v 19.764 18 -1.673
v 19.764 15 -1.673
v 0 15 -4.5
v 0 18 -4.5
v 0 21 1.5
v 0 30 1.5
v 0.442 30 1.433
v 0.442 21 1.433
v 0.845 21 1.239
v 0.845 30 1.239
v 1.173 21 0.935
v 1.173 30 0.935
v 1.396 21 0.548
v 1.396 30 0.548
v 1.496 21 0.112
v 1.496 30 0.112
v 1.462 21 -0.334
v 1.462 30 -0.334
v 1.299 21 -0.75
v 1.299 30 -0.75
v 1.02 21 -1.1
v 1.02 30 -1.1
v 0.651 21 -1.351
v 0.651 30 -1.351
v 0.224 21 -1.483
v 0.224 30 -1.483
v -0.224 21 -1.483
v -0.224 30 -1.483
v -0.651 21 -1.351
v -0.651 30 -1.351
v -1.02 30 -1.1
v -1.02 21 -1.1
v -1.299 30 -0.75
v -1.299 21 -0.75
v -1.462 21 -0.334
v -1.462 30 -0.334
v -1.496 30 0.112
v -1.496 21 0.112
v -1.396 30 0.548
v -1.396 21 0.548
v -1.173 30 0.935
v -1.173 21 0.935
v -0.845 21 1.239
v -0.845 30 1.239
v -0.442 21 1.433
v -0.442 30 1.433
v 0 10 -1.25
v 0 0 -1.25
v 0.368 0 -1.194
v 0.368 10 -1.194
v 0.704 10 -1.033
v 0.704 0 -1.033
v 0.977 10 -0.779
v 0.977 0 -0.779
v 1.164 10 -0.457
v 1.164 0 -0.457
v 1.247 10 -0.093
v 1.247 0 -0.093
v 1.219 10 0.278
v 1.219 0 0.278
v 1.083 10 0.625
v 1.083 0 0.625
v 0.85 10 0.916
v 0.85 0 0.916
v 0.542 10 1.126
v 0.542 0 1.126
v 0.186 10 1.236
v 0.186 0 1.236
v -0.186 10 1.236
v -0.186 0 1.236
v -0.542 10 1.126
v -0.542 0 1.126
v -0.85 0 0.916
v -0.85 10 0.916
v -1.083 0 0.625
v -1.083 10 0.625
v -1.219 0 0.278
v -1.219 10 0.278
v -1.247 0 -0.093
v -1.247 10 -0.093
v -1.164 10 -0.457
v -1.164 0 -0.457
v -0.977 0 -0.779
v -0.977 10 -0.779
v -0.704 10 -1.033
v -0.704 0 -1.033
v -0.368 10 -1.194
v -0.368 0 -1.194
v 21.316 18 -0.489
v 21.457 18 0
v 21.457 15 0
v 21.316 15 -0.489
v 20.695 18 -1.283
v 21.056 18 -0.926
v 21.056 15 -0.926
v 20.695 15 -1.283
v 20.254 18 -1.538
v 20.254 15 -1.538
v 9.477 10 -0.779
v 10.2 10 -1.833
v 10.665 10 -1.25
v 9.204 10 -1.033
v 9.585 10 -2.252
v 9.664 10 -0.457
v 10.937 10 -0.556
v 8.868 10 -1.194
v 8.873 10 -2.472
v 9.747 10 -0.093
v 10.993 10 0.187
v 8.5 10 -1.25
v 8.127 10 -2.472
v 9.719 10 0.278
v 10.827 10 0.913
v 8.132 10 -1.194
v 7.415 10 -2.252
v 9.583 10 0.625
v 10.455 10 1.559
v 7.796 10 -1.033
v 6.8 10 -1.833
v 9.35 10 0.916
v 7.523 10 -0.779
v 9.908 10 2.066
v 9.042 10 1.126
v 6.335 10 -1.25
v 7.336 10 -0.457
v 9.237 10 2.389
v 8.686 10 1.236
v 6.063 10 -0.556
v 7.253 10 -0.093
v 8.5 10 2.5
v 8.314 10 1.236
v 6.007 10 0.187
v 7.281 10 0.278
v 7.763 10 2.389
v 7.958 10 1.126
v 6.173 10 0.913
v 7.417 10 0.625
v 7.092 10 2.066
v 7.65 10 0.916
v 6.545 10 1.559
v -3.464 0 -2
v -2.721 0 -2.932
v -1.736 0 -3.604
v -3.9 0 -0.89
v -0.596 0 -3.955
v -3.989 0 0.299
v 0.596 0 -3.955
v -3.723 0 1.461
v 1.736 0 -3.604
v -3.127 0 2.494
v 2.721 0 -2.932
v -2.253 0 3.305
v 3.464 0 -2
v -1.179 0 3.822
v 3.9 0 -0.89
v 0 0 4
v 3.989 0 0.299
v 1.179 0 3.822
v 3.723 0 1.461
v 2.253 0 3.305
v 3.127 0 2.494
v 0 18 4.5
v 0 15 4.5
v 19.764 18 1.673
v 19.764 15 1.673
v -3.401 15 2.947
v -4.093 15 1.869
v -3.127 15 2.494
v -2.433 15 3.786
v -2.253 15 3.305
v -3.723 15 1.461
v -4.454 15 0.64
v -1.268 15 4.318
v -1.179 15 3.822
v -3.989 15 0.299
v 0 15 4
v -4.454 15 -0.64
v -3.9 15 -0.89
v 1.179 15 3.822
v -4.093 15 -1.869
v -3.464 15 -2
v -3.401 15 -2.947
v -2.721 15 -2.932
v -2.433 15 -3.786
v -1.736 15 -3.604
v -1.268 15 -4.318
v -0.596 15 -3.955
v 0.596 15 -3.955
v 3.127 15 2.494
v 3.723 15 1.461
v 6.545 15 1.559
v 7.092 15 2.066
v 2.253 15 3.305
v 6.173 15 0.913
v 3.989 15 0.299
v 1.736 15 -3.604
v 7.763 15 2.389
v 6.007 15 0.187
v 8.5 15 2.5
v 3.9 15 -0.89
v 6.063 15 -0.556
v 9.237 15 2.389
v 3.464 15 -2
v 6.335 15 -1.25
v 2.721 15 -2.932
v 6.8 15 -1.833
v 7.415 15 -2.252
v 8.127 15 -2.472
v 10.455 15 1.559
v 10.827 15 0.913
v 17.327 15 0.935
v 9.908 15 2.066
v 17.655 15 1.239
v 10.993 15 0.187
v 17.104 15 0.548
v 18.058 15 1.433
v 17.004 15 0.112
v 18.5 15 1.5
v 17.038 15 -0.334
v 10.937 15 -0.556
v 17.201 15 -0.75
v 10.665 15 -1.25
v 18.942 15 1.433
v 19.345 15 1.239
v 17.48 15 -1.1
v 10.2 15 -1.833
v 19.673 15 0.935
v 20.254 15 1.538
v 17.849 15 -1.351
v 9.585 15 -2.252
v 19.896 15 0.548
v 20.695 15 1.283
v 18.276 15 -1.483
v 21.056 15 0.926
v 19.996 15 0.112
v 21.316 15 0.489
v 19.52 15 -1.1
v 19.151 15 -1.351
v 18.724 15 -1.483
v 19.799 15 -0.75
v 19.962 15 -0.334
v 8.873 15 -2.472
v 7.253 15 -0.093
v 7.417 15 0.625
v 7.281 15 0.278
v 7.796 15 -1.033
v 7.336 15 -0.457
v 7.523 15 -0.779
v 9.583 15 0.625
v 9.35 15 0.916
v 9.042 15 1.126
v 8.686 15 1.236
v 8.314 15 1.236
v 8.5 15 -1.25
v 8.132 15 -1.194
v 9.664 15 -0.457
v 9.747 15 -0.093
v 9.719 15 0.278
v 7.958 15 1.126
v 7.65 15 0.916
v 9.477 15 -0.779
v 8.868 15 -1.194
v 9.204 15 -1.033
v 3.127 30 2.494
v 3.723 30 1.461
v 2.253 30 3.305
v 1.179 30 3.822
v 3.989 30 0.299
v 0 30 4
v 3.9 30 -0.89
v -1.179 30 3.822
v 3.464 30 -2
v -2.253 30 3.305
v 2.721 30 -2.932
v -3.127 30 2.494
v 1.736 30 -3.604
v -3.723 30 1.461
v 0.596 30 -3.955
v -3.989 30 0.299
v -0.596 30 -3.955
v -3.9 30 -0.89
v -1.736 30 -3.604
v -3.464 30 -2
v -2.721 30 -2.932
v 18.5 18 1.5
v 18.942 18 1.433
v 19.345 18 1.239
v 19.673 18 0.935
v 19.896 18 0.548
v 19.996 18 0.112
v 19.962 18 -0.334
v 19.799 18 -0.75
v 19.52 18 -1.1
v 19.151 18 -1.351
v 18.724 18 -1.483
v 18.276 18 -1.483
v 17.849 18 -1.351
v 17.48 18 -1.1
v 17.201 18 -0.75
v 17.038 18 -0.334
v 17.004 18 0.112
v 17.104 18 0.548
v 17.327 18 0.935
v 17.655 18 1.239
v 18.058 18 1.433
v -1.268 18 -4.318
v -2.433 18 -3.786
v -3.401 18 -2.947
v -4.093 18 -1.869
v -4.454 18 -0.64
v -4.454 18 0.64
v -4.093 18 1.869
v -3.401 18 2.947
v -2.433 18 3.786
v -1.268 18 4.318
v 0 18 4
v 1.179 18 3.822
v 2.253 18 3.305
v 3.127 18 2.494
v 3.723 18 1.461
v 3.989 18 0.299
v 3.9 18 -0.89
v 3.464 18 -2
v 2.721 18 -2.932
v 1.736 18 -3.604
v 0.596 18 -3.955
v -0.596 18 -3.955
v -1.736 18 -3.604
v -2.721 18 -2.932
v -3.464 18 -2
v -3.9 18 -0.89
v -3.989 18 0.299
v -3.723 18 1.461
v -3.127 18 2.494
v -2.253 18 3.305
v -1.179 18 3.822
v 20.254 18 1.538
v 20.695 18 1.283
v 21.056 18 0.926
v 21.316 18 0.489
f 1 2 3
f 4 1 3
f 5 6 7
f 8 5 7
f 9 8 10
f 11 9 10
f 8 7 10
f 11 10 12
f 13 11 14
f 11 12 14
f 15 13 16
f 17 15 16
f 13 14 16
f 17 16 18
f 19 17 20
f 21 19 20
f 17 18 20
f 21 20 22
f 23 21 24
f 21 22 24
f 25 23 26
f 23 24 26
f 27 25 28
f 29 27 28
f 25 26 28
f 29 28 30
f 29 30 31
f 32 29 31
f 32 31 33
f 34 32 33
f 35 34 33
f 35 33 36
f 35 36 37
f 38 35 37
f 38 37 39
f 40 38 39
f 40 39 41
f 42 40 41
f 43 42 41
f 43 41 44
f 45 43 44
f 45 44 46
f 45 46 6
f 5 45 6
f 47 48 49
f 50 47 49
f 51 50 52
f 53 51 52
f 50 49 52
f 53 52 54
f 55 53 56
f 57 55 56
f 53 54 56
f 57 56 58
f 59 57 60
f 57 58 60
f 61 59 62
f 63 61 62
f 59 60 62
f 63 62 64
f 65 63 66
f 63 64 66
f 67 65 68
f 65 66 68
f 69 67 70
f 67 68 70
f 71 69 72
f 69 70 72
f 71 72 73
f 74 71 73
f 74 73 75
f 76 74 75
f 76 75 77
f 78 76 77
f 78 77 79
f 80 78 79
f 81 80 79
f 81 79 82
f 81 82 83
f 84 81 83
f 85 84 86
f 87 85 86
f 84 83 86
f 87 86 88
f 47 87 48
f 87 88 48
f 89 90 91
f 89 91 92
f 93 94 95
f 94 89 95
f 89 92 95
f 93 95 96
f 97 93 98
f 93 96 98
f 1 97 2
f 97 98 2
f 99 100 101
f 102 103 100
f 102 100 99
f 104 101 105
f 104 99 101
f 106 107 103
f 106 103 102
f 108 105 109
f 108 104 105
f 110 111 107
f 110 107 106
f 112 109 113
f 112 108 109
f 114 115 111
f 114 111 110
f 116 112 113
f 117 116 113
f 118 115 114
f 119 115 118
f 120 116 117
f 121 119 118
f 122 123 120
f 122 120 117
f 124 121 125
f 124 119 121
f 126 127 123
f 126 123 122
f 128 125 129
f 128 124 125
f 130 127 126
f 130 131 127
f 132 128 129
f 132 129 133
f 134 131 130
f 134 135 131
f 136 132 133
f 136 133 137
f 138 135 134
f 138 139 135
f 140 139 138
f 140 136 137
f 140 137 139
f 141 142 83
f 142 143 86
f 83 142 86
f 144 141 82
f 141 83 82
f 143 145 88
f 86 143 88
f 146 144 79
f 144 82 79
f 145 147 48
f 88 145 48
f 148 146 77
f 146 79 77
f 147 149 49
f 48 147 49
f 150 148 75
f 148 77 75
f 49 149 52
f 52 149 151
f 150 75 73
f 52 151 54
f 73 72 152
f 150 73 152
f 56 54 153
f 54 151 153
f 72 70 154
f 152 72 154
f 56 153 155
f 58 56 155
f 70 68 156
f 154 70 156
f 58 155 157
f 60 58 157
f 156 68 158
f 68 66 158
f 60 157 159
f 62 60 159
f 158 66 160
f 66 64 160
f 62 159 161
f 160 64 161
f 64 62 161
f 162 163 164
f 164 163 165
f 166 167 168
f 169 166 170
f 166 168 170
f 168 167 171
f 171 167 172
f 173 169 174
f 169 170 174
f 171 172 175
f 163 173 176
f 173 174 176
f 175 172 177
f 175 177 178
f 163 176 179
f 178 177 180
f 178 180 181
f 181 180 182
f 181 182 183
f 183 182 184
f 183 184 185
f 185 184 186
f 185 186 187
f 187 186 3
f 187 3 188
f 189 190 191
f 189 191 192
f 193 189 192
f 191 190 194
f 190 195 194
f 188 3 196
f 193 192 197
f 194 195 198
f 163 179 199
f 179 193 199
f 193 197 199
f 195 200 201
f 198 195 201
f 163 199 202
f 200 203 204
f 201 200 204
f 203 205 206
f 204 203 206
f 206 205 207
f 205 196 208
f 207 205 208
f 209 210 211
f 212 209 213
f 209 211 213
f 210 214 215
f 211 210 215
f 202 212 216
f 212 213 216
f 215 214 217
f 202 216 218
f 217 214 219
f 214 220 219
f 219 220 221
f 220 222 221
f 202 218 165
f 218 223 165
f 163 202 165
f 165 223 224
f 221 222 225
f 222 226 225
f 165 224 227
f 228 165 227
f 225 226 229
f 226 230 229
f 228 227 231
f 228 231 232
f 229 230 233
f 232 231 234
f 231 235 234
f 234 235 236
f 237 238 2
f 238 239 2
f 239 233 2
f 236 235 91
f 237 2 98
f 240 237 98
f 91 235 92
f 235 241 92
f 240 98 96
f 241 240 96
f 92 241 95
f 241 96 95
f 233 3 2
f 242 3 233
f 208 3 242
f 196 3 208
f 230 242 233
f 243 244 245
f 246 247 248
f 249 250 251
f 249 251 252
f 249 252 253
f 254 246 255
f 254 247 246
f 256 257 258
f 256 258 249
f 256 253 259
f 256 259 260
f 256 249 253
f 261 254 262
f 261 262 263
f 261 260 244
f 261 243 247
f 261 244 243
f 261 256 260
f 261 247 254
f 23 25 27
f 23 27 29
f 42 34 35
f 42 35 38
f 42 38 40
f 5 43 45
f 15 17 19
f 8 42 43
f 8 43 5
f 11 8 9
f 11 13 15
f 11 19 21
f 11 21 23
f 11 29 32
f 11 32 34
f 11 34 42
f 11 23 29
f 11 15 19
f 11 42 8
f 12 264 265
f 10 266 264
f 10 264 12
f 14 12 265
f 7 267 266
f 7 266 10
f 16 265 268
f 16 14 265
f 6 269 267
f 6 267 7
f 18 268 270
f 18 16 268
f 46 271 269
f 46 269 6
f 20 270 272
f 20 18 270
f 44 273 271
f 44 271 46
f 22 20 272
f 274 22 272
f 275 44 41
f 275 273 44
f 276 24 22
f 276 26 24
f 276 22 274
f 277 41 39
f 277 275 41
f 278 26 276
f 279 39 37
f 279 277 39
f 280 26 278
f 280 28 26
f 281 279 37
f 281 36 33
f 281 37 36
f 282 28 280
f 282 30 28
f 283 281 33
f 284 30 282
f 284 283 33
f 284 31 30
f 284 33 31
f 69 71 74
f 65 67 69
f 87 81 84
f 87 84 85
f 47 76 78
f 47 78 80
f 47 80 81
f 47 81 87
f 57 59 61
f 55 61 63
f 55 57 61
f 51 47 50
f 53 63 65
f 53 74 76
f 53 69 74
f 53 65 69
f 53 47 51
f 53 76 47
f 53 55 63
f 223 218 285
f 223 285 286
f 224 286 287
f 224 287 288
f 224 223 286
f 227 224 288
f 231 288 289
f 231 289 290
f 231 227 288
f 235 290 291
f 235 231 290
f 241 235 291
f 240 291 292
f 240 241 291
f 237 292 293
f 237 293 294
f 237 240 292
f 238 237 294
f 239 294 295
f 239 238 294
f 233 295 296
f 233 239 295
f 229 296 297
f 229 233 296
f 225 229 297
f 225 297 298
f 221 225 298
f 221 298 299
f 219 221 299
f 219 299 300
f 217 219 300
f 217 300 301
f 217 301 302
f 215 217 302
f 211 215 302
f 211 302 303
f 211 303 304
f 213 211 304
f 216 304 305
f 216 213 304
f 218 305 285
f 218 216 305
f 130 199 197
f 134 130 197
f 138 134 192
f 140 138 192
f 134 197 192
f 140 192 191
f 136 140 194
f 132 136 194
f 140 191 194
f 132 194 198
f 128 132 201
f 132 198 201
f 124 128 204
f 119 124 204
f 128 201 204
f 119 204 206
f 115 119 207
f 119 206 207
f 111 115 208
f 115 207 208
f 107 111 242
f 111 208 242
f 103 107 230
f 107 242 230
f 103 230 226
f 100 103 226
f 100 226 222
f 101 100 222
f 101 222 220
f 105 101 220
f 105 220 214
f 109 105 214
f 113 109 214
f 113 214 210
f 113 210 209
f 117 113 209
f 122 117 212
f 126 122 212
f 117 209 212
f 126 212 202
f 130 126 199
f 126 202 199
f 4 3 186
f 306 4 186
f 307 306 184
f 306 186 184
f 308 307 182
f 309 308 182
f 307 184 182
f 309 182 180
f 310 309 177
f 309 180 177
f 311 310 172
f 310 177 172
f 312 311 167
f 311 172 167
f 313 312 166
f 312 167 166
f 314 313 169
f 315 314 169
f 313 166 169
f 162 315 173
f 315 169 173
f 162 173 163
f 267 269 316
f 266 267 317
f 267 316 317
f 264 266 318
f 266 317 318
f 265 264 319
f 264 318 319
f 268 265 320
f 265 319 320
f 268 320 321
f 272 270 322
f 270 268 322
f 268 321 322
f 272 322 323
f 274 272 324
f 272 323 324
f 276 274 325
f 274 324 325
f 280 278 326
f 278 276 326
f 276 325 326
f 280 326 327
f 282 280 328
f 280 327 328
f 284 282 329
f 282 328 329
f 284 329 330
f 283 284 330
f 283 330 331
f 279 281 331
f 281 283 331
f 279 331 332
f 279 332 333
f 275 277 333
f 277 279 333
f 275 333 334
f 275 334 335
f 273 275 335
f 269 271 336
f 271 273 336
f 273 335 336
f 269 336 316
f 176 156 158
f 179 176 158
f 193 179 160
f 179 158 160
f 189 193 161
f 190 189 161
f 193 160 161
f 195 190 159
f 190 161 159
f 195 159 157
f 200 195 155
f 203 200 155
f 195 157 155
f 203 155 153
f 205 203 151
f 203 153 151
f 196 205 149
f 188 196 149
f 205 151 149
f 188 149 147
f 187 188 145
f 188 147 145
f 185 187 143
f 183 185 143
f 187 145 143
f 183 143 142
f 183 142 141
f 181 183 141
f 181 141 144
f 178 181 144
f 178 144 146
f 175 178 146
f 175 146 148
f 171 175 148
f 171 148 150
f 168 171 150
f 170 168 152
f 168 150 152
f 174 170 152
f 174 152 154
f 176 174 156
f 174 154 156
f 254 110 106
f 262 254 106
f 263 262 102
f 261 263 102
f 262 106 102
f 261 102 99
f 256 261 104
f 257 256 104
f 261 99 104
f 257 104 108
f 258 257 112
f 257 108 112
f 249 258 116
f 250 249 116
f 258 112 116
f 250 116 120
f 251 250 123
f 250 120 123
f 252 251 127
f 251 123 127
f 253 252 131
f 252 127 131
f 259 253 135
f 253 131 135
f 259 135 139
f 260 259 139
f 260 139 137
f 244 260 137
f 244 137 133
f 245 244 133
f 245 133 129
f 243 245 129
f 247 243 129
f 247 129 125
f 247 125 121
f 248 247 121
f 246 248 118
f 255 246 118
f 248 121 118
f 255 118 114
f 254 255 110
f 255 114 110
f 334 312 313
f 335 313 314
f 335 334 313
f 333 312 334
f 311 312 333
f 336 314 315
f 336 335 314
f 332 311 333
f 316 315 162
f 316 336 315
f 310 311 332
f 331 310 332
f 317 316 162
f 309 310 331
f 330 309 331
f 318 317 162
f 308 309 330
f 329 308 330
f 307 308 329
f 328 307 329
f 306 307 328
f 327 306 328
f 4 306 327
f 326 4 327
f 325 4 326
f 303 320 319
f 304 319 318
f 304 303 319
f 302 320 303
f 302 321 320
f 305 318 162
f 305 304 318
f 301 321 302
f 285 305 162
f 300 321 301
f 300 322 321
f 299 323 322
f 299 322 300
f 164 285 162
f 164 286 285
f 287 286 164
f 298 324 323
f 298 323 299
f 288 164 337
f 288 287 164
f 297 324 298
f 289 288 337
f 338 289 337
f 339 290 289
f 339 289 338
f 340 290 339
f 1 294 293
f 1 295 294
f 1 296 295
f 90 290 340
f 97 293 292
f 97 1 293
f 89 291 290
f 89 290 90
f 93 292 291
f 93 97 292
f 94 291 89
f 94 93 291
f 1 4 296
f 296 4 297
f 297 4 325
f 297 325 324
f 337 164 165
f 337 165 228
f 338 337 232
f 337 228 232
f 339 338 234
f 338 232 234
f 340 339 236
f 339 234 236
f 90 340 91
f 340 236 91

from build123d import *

# Parameters (mm, degrees)
SKETCH1_R           = 4
BOSS_EXTRUDE1_DEPTH = 15
SKETCH2_R           = 1.5
BOSS_EXTRUDE4_DEPTH = 3
FILLET4_R           = 2
SKETCH7_R           = 4
BOSS_EXTRUDE5_DEPTH = 13
SKETCH8_R           = 1.5
CUT_EXTRUDE6_DEPTH  = 10
SKETCH10_R          = 1.25
CUT_EXTRUDE7_DEPTH  = 10
SKETCH11_R          = 2.5
BOSS_EXTRUDE6_DEPTH = 5
SKETCH12_R          = 1.25
CUT_EXTRUDE8_DEPTH  = 5
CUT_EXTRUDE10_START = -1
SKETCH14_R          = 4
CUT_EXTRUDE10_DEPTH = 1


with BuildPart() as part:
    # Sketch1 → Boss-Extrude1 (new body)
    with BuildSketch(Plane(origin=(0, 0, 0), x_dir=(1, 0, 0), z_dir=(0, 1, 0))):
        with Locations(Location((0, 0, 0), (0, 0, 270))):
            Circle(SKETCH1_R)
    extrude(amount=BOSS_EXTRUDE1_DEPTH)

    # Sketch2 → Boss-Extrude4 (add)
    with BuildSketch(Plane(origin=(0, 15, 0), x_dir=(1, 0, 0), z_dir=(0, 1, 0))):
        with BuildLine():
            Line((21.256644483, 1.459786884), (0, 4.5))
            ThreePointArc((0, 4.5), (-4.5, 0), (0, -4.5))
            Line((0, -4.5), (21.256644483, -1.459786884))
            ThreePointArc((21.256644483, -1.459786884), (21.5, 0), (21.256644483, 1.459786884))
        make_face()
        with Locations(Location((18.5, 0, 0), (0, 0, 270))):
            Circle(SKETCH2_R, mode=Mode.SUBTRACT)
    extrude(amount=BOSS_EXTRUDE4_DEPTH)

    # Fillet4
    # the kernel refuses this fillet: 2 mm, written as the material it takes off along each edge
    with BuildSketch(Plane(origin=(21.256644483, 9.943560337, -1.459786884), x_dir=(0.10352186513244716, 0, 0.9946271781122308), z_dir=(0, 1, 0))) as fillet4_piece_1:
        with BuildLine():
            CenterArc((1.573114562, -1.948841845), FILLET4_R, 77.012959975, 88.905549933)
            Line((-0.366786771, -1.462238498), (0, 0))
            ThreePointArc((0, 0), (1.011287933, 0.115105849), (2.022575865, 0))
        make_face()
    extrude(amount=13.112879326, mode=Mode.SUBTRACT)
    with BuildSketch(Plane(origin=(21.256644483, 9.943560337, 1.459786884), x_dir=(-0.9899263374983104, 0, 0.14158335469673372), z_dir=(0, 1, 0))) as fillet4_piece_2:
        with BuildLine():
            CenterArc((1.507539041, -2), FILLET4_R, 90, 88.905549933)
            ThreePointArc((-0.492096093, -1.961798809), (-0.357695041, -0.952893959), (0, 0))
            Line((0, 0), (1.507539041, 0))
        make_face()
    extrude(amount=13.112879326, mode=Mode.SUBTRACT)

    # Sketch7 → Boss-Extrude5 (add)
    with BuildSketch(Plane(origin=(0, 18, 0), x_dir=(1, 0, 0), z_dir=(0, 1, 0))):
        with Locations(Location((0, 0, 0), (0, 0, 270))):
            Circle(SKETCH7_R)
    extrude(amount=BOSS_EXTRUDE5_DEPTH)

    # Sketch8 → Cut-Extrude6 (cut)
    with BuildSketch(Plane(origin=(0, 31, 0), x_dir=(1, 0, 0), z_dir=(0, 1, 0))):
        with Locations(Location((0, 0, 0), (0, 0, 270))):
            Circle(SKETCH8_R)
    extrude(amount=-CUT_EXTRUDE6_DEPTH, mode=Mode.SUBTRACT)

    # Sketch10 → Cut-Extrude7 (cut)
    with BuildSketch(Plane.XZ):
        with Locations(Location((0, 0, 0), (0, 0, 270))):
            Circle(SKETCH10_R)
    extrude(amount=-CUT_EXTRUDE7_DEPTH, mode=Mode.SUBTRACT)

    # Sketch11 → Boss-Extrude6 (add)
    with BuildSketch(Plane.XZ.offset(-15)):
        with Locations(Location((8.5, 0, 0), (0, 0, 90))):
            Circle(SKETCH11_R)
    extrude(amount=BOSS_EXTRUDE6_DEPTH)

    # Sketch12 → Cut-Extrude8 (cut)
    with BuildSketch(Plane.XZ.offset(-10)):
        with Locations(Location((8.5, 0, 0), (0, 0, 270))):
            Circle(SKETCH12_R)
    extrude(amount=-CUT_EXTRUDE8_DEPTH, mode=Mode.SUBTRACT)

    # Sketch14 → Cut-Extrude10 (cut)
    with BuildSketch(Plane(origin=(0, 31, 0), x_dir=(1, 0, 0), z_dir=(0, 1, 0)).offset(CUT_EXTRUDE10_START)):
        with Locations(Location((0, 0, 0), (0, 0, 90))):
            Circle(SKETCH14_R)
    extrude(amount=CUT_EXTRUDE10_DEPTH, mode=Mode.SUBTRACT)


solid = part.part
